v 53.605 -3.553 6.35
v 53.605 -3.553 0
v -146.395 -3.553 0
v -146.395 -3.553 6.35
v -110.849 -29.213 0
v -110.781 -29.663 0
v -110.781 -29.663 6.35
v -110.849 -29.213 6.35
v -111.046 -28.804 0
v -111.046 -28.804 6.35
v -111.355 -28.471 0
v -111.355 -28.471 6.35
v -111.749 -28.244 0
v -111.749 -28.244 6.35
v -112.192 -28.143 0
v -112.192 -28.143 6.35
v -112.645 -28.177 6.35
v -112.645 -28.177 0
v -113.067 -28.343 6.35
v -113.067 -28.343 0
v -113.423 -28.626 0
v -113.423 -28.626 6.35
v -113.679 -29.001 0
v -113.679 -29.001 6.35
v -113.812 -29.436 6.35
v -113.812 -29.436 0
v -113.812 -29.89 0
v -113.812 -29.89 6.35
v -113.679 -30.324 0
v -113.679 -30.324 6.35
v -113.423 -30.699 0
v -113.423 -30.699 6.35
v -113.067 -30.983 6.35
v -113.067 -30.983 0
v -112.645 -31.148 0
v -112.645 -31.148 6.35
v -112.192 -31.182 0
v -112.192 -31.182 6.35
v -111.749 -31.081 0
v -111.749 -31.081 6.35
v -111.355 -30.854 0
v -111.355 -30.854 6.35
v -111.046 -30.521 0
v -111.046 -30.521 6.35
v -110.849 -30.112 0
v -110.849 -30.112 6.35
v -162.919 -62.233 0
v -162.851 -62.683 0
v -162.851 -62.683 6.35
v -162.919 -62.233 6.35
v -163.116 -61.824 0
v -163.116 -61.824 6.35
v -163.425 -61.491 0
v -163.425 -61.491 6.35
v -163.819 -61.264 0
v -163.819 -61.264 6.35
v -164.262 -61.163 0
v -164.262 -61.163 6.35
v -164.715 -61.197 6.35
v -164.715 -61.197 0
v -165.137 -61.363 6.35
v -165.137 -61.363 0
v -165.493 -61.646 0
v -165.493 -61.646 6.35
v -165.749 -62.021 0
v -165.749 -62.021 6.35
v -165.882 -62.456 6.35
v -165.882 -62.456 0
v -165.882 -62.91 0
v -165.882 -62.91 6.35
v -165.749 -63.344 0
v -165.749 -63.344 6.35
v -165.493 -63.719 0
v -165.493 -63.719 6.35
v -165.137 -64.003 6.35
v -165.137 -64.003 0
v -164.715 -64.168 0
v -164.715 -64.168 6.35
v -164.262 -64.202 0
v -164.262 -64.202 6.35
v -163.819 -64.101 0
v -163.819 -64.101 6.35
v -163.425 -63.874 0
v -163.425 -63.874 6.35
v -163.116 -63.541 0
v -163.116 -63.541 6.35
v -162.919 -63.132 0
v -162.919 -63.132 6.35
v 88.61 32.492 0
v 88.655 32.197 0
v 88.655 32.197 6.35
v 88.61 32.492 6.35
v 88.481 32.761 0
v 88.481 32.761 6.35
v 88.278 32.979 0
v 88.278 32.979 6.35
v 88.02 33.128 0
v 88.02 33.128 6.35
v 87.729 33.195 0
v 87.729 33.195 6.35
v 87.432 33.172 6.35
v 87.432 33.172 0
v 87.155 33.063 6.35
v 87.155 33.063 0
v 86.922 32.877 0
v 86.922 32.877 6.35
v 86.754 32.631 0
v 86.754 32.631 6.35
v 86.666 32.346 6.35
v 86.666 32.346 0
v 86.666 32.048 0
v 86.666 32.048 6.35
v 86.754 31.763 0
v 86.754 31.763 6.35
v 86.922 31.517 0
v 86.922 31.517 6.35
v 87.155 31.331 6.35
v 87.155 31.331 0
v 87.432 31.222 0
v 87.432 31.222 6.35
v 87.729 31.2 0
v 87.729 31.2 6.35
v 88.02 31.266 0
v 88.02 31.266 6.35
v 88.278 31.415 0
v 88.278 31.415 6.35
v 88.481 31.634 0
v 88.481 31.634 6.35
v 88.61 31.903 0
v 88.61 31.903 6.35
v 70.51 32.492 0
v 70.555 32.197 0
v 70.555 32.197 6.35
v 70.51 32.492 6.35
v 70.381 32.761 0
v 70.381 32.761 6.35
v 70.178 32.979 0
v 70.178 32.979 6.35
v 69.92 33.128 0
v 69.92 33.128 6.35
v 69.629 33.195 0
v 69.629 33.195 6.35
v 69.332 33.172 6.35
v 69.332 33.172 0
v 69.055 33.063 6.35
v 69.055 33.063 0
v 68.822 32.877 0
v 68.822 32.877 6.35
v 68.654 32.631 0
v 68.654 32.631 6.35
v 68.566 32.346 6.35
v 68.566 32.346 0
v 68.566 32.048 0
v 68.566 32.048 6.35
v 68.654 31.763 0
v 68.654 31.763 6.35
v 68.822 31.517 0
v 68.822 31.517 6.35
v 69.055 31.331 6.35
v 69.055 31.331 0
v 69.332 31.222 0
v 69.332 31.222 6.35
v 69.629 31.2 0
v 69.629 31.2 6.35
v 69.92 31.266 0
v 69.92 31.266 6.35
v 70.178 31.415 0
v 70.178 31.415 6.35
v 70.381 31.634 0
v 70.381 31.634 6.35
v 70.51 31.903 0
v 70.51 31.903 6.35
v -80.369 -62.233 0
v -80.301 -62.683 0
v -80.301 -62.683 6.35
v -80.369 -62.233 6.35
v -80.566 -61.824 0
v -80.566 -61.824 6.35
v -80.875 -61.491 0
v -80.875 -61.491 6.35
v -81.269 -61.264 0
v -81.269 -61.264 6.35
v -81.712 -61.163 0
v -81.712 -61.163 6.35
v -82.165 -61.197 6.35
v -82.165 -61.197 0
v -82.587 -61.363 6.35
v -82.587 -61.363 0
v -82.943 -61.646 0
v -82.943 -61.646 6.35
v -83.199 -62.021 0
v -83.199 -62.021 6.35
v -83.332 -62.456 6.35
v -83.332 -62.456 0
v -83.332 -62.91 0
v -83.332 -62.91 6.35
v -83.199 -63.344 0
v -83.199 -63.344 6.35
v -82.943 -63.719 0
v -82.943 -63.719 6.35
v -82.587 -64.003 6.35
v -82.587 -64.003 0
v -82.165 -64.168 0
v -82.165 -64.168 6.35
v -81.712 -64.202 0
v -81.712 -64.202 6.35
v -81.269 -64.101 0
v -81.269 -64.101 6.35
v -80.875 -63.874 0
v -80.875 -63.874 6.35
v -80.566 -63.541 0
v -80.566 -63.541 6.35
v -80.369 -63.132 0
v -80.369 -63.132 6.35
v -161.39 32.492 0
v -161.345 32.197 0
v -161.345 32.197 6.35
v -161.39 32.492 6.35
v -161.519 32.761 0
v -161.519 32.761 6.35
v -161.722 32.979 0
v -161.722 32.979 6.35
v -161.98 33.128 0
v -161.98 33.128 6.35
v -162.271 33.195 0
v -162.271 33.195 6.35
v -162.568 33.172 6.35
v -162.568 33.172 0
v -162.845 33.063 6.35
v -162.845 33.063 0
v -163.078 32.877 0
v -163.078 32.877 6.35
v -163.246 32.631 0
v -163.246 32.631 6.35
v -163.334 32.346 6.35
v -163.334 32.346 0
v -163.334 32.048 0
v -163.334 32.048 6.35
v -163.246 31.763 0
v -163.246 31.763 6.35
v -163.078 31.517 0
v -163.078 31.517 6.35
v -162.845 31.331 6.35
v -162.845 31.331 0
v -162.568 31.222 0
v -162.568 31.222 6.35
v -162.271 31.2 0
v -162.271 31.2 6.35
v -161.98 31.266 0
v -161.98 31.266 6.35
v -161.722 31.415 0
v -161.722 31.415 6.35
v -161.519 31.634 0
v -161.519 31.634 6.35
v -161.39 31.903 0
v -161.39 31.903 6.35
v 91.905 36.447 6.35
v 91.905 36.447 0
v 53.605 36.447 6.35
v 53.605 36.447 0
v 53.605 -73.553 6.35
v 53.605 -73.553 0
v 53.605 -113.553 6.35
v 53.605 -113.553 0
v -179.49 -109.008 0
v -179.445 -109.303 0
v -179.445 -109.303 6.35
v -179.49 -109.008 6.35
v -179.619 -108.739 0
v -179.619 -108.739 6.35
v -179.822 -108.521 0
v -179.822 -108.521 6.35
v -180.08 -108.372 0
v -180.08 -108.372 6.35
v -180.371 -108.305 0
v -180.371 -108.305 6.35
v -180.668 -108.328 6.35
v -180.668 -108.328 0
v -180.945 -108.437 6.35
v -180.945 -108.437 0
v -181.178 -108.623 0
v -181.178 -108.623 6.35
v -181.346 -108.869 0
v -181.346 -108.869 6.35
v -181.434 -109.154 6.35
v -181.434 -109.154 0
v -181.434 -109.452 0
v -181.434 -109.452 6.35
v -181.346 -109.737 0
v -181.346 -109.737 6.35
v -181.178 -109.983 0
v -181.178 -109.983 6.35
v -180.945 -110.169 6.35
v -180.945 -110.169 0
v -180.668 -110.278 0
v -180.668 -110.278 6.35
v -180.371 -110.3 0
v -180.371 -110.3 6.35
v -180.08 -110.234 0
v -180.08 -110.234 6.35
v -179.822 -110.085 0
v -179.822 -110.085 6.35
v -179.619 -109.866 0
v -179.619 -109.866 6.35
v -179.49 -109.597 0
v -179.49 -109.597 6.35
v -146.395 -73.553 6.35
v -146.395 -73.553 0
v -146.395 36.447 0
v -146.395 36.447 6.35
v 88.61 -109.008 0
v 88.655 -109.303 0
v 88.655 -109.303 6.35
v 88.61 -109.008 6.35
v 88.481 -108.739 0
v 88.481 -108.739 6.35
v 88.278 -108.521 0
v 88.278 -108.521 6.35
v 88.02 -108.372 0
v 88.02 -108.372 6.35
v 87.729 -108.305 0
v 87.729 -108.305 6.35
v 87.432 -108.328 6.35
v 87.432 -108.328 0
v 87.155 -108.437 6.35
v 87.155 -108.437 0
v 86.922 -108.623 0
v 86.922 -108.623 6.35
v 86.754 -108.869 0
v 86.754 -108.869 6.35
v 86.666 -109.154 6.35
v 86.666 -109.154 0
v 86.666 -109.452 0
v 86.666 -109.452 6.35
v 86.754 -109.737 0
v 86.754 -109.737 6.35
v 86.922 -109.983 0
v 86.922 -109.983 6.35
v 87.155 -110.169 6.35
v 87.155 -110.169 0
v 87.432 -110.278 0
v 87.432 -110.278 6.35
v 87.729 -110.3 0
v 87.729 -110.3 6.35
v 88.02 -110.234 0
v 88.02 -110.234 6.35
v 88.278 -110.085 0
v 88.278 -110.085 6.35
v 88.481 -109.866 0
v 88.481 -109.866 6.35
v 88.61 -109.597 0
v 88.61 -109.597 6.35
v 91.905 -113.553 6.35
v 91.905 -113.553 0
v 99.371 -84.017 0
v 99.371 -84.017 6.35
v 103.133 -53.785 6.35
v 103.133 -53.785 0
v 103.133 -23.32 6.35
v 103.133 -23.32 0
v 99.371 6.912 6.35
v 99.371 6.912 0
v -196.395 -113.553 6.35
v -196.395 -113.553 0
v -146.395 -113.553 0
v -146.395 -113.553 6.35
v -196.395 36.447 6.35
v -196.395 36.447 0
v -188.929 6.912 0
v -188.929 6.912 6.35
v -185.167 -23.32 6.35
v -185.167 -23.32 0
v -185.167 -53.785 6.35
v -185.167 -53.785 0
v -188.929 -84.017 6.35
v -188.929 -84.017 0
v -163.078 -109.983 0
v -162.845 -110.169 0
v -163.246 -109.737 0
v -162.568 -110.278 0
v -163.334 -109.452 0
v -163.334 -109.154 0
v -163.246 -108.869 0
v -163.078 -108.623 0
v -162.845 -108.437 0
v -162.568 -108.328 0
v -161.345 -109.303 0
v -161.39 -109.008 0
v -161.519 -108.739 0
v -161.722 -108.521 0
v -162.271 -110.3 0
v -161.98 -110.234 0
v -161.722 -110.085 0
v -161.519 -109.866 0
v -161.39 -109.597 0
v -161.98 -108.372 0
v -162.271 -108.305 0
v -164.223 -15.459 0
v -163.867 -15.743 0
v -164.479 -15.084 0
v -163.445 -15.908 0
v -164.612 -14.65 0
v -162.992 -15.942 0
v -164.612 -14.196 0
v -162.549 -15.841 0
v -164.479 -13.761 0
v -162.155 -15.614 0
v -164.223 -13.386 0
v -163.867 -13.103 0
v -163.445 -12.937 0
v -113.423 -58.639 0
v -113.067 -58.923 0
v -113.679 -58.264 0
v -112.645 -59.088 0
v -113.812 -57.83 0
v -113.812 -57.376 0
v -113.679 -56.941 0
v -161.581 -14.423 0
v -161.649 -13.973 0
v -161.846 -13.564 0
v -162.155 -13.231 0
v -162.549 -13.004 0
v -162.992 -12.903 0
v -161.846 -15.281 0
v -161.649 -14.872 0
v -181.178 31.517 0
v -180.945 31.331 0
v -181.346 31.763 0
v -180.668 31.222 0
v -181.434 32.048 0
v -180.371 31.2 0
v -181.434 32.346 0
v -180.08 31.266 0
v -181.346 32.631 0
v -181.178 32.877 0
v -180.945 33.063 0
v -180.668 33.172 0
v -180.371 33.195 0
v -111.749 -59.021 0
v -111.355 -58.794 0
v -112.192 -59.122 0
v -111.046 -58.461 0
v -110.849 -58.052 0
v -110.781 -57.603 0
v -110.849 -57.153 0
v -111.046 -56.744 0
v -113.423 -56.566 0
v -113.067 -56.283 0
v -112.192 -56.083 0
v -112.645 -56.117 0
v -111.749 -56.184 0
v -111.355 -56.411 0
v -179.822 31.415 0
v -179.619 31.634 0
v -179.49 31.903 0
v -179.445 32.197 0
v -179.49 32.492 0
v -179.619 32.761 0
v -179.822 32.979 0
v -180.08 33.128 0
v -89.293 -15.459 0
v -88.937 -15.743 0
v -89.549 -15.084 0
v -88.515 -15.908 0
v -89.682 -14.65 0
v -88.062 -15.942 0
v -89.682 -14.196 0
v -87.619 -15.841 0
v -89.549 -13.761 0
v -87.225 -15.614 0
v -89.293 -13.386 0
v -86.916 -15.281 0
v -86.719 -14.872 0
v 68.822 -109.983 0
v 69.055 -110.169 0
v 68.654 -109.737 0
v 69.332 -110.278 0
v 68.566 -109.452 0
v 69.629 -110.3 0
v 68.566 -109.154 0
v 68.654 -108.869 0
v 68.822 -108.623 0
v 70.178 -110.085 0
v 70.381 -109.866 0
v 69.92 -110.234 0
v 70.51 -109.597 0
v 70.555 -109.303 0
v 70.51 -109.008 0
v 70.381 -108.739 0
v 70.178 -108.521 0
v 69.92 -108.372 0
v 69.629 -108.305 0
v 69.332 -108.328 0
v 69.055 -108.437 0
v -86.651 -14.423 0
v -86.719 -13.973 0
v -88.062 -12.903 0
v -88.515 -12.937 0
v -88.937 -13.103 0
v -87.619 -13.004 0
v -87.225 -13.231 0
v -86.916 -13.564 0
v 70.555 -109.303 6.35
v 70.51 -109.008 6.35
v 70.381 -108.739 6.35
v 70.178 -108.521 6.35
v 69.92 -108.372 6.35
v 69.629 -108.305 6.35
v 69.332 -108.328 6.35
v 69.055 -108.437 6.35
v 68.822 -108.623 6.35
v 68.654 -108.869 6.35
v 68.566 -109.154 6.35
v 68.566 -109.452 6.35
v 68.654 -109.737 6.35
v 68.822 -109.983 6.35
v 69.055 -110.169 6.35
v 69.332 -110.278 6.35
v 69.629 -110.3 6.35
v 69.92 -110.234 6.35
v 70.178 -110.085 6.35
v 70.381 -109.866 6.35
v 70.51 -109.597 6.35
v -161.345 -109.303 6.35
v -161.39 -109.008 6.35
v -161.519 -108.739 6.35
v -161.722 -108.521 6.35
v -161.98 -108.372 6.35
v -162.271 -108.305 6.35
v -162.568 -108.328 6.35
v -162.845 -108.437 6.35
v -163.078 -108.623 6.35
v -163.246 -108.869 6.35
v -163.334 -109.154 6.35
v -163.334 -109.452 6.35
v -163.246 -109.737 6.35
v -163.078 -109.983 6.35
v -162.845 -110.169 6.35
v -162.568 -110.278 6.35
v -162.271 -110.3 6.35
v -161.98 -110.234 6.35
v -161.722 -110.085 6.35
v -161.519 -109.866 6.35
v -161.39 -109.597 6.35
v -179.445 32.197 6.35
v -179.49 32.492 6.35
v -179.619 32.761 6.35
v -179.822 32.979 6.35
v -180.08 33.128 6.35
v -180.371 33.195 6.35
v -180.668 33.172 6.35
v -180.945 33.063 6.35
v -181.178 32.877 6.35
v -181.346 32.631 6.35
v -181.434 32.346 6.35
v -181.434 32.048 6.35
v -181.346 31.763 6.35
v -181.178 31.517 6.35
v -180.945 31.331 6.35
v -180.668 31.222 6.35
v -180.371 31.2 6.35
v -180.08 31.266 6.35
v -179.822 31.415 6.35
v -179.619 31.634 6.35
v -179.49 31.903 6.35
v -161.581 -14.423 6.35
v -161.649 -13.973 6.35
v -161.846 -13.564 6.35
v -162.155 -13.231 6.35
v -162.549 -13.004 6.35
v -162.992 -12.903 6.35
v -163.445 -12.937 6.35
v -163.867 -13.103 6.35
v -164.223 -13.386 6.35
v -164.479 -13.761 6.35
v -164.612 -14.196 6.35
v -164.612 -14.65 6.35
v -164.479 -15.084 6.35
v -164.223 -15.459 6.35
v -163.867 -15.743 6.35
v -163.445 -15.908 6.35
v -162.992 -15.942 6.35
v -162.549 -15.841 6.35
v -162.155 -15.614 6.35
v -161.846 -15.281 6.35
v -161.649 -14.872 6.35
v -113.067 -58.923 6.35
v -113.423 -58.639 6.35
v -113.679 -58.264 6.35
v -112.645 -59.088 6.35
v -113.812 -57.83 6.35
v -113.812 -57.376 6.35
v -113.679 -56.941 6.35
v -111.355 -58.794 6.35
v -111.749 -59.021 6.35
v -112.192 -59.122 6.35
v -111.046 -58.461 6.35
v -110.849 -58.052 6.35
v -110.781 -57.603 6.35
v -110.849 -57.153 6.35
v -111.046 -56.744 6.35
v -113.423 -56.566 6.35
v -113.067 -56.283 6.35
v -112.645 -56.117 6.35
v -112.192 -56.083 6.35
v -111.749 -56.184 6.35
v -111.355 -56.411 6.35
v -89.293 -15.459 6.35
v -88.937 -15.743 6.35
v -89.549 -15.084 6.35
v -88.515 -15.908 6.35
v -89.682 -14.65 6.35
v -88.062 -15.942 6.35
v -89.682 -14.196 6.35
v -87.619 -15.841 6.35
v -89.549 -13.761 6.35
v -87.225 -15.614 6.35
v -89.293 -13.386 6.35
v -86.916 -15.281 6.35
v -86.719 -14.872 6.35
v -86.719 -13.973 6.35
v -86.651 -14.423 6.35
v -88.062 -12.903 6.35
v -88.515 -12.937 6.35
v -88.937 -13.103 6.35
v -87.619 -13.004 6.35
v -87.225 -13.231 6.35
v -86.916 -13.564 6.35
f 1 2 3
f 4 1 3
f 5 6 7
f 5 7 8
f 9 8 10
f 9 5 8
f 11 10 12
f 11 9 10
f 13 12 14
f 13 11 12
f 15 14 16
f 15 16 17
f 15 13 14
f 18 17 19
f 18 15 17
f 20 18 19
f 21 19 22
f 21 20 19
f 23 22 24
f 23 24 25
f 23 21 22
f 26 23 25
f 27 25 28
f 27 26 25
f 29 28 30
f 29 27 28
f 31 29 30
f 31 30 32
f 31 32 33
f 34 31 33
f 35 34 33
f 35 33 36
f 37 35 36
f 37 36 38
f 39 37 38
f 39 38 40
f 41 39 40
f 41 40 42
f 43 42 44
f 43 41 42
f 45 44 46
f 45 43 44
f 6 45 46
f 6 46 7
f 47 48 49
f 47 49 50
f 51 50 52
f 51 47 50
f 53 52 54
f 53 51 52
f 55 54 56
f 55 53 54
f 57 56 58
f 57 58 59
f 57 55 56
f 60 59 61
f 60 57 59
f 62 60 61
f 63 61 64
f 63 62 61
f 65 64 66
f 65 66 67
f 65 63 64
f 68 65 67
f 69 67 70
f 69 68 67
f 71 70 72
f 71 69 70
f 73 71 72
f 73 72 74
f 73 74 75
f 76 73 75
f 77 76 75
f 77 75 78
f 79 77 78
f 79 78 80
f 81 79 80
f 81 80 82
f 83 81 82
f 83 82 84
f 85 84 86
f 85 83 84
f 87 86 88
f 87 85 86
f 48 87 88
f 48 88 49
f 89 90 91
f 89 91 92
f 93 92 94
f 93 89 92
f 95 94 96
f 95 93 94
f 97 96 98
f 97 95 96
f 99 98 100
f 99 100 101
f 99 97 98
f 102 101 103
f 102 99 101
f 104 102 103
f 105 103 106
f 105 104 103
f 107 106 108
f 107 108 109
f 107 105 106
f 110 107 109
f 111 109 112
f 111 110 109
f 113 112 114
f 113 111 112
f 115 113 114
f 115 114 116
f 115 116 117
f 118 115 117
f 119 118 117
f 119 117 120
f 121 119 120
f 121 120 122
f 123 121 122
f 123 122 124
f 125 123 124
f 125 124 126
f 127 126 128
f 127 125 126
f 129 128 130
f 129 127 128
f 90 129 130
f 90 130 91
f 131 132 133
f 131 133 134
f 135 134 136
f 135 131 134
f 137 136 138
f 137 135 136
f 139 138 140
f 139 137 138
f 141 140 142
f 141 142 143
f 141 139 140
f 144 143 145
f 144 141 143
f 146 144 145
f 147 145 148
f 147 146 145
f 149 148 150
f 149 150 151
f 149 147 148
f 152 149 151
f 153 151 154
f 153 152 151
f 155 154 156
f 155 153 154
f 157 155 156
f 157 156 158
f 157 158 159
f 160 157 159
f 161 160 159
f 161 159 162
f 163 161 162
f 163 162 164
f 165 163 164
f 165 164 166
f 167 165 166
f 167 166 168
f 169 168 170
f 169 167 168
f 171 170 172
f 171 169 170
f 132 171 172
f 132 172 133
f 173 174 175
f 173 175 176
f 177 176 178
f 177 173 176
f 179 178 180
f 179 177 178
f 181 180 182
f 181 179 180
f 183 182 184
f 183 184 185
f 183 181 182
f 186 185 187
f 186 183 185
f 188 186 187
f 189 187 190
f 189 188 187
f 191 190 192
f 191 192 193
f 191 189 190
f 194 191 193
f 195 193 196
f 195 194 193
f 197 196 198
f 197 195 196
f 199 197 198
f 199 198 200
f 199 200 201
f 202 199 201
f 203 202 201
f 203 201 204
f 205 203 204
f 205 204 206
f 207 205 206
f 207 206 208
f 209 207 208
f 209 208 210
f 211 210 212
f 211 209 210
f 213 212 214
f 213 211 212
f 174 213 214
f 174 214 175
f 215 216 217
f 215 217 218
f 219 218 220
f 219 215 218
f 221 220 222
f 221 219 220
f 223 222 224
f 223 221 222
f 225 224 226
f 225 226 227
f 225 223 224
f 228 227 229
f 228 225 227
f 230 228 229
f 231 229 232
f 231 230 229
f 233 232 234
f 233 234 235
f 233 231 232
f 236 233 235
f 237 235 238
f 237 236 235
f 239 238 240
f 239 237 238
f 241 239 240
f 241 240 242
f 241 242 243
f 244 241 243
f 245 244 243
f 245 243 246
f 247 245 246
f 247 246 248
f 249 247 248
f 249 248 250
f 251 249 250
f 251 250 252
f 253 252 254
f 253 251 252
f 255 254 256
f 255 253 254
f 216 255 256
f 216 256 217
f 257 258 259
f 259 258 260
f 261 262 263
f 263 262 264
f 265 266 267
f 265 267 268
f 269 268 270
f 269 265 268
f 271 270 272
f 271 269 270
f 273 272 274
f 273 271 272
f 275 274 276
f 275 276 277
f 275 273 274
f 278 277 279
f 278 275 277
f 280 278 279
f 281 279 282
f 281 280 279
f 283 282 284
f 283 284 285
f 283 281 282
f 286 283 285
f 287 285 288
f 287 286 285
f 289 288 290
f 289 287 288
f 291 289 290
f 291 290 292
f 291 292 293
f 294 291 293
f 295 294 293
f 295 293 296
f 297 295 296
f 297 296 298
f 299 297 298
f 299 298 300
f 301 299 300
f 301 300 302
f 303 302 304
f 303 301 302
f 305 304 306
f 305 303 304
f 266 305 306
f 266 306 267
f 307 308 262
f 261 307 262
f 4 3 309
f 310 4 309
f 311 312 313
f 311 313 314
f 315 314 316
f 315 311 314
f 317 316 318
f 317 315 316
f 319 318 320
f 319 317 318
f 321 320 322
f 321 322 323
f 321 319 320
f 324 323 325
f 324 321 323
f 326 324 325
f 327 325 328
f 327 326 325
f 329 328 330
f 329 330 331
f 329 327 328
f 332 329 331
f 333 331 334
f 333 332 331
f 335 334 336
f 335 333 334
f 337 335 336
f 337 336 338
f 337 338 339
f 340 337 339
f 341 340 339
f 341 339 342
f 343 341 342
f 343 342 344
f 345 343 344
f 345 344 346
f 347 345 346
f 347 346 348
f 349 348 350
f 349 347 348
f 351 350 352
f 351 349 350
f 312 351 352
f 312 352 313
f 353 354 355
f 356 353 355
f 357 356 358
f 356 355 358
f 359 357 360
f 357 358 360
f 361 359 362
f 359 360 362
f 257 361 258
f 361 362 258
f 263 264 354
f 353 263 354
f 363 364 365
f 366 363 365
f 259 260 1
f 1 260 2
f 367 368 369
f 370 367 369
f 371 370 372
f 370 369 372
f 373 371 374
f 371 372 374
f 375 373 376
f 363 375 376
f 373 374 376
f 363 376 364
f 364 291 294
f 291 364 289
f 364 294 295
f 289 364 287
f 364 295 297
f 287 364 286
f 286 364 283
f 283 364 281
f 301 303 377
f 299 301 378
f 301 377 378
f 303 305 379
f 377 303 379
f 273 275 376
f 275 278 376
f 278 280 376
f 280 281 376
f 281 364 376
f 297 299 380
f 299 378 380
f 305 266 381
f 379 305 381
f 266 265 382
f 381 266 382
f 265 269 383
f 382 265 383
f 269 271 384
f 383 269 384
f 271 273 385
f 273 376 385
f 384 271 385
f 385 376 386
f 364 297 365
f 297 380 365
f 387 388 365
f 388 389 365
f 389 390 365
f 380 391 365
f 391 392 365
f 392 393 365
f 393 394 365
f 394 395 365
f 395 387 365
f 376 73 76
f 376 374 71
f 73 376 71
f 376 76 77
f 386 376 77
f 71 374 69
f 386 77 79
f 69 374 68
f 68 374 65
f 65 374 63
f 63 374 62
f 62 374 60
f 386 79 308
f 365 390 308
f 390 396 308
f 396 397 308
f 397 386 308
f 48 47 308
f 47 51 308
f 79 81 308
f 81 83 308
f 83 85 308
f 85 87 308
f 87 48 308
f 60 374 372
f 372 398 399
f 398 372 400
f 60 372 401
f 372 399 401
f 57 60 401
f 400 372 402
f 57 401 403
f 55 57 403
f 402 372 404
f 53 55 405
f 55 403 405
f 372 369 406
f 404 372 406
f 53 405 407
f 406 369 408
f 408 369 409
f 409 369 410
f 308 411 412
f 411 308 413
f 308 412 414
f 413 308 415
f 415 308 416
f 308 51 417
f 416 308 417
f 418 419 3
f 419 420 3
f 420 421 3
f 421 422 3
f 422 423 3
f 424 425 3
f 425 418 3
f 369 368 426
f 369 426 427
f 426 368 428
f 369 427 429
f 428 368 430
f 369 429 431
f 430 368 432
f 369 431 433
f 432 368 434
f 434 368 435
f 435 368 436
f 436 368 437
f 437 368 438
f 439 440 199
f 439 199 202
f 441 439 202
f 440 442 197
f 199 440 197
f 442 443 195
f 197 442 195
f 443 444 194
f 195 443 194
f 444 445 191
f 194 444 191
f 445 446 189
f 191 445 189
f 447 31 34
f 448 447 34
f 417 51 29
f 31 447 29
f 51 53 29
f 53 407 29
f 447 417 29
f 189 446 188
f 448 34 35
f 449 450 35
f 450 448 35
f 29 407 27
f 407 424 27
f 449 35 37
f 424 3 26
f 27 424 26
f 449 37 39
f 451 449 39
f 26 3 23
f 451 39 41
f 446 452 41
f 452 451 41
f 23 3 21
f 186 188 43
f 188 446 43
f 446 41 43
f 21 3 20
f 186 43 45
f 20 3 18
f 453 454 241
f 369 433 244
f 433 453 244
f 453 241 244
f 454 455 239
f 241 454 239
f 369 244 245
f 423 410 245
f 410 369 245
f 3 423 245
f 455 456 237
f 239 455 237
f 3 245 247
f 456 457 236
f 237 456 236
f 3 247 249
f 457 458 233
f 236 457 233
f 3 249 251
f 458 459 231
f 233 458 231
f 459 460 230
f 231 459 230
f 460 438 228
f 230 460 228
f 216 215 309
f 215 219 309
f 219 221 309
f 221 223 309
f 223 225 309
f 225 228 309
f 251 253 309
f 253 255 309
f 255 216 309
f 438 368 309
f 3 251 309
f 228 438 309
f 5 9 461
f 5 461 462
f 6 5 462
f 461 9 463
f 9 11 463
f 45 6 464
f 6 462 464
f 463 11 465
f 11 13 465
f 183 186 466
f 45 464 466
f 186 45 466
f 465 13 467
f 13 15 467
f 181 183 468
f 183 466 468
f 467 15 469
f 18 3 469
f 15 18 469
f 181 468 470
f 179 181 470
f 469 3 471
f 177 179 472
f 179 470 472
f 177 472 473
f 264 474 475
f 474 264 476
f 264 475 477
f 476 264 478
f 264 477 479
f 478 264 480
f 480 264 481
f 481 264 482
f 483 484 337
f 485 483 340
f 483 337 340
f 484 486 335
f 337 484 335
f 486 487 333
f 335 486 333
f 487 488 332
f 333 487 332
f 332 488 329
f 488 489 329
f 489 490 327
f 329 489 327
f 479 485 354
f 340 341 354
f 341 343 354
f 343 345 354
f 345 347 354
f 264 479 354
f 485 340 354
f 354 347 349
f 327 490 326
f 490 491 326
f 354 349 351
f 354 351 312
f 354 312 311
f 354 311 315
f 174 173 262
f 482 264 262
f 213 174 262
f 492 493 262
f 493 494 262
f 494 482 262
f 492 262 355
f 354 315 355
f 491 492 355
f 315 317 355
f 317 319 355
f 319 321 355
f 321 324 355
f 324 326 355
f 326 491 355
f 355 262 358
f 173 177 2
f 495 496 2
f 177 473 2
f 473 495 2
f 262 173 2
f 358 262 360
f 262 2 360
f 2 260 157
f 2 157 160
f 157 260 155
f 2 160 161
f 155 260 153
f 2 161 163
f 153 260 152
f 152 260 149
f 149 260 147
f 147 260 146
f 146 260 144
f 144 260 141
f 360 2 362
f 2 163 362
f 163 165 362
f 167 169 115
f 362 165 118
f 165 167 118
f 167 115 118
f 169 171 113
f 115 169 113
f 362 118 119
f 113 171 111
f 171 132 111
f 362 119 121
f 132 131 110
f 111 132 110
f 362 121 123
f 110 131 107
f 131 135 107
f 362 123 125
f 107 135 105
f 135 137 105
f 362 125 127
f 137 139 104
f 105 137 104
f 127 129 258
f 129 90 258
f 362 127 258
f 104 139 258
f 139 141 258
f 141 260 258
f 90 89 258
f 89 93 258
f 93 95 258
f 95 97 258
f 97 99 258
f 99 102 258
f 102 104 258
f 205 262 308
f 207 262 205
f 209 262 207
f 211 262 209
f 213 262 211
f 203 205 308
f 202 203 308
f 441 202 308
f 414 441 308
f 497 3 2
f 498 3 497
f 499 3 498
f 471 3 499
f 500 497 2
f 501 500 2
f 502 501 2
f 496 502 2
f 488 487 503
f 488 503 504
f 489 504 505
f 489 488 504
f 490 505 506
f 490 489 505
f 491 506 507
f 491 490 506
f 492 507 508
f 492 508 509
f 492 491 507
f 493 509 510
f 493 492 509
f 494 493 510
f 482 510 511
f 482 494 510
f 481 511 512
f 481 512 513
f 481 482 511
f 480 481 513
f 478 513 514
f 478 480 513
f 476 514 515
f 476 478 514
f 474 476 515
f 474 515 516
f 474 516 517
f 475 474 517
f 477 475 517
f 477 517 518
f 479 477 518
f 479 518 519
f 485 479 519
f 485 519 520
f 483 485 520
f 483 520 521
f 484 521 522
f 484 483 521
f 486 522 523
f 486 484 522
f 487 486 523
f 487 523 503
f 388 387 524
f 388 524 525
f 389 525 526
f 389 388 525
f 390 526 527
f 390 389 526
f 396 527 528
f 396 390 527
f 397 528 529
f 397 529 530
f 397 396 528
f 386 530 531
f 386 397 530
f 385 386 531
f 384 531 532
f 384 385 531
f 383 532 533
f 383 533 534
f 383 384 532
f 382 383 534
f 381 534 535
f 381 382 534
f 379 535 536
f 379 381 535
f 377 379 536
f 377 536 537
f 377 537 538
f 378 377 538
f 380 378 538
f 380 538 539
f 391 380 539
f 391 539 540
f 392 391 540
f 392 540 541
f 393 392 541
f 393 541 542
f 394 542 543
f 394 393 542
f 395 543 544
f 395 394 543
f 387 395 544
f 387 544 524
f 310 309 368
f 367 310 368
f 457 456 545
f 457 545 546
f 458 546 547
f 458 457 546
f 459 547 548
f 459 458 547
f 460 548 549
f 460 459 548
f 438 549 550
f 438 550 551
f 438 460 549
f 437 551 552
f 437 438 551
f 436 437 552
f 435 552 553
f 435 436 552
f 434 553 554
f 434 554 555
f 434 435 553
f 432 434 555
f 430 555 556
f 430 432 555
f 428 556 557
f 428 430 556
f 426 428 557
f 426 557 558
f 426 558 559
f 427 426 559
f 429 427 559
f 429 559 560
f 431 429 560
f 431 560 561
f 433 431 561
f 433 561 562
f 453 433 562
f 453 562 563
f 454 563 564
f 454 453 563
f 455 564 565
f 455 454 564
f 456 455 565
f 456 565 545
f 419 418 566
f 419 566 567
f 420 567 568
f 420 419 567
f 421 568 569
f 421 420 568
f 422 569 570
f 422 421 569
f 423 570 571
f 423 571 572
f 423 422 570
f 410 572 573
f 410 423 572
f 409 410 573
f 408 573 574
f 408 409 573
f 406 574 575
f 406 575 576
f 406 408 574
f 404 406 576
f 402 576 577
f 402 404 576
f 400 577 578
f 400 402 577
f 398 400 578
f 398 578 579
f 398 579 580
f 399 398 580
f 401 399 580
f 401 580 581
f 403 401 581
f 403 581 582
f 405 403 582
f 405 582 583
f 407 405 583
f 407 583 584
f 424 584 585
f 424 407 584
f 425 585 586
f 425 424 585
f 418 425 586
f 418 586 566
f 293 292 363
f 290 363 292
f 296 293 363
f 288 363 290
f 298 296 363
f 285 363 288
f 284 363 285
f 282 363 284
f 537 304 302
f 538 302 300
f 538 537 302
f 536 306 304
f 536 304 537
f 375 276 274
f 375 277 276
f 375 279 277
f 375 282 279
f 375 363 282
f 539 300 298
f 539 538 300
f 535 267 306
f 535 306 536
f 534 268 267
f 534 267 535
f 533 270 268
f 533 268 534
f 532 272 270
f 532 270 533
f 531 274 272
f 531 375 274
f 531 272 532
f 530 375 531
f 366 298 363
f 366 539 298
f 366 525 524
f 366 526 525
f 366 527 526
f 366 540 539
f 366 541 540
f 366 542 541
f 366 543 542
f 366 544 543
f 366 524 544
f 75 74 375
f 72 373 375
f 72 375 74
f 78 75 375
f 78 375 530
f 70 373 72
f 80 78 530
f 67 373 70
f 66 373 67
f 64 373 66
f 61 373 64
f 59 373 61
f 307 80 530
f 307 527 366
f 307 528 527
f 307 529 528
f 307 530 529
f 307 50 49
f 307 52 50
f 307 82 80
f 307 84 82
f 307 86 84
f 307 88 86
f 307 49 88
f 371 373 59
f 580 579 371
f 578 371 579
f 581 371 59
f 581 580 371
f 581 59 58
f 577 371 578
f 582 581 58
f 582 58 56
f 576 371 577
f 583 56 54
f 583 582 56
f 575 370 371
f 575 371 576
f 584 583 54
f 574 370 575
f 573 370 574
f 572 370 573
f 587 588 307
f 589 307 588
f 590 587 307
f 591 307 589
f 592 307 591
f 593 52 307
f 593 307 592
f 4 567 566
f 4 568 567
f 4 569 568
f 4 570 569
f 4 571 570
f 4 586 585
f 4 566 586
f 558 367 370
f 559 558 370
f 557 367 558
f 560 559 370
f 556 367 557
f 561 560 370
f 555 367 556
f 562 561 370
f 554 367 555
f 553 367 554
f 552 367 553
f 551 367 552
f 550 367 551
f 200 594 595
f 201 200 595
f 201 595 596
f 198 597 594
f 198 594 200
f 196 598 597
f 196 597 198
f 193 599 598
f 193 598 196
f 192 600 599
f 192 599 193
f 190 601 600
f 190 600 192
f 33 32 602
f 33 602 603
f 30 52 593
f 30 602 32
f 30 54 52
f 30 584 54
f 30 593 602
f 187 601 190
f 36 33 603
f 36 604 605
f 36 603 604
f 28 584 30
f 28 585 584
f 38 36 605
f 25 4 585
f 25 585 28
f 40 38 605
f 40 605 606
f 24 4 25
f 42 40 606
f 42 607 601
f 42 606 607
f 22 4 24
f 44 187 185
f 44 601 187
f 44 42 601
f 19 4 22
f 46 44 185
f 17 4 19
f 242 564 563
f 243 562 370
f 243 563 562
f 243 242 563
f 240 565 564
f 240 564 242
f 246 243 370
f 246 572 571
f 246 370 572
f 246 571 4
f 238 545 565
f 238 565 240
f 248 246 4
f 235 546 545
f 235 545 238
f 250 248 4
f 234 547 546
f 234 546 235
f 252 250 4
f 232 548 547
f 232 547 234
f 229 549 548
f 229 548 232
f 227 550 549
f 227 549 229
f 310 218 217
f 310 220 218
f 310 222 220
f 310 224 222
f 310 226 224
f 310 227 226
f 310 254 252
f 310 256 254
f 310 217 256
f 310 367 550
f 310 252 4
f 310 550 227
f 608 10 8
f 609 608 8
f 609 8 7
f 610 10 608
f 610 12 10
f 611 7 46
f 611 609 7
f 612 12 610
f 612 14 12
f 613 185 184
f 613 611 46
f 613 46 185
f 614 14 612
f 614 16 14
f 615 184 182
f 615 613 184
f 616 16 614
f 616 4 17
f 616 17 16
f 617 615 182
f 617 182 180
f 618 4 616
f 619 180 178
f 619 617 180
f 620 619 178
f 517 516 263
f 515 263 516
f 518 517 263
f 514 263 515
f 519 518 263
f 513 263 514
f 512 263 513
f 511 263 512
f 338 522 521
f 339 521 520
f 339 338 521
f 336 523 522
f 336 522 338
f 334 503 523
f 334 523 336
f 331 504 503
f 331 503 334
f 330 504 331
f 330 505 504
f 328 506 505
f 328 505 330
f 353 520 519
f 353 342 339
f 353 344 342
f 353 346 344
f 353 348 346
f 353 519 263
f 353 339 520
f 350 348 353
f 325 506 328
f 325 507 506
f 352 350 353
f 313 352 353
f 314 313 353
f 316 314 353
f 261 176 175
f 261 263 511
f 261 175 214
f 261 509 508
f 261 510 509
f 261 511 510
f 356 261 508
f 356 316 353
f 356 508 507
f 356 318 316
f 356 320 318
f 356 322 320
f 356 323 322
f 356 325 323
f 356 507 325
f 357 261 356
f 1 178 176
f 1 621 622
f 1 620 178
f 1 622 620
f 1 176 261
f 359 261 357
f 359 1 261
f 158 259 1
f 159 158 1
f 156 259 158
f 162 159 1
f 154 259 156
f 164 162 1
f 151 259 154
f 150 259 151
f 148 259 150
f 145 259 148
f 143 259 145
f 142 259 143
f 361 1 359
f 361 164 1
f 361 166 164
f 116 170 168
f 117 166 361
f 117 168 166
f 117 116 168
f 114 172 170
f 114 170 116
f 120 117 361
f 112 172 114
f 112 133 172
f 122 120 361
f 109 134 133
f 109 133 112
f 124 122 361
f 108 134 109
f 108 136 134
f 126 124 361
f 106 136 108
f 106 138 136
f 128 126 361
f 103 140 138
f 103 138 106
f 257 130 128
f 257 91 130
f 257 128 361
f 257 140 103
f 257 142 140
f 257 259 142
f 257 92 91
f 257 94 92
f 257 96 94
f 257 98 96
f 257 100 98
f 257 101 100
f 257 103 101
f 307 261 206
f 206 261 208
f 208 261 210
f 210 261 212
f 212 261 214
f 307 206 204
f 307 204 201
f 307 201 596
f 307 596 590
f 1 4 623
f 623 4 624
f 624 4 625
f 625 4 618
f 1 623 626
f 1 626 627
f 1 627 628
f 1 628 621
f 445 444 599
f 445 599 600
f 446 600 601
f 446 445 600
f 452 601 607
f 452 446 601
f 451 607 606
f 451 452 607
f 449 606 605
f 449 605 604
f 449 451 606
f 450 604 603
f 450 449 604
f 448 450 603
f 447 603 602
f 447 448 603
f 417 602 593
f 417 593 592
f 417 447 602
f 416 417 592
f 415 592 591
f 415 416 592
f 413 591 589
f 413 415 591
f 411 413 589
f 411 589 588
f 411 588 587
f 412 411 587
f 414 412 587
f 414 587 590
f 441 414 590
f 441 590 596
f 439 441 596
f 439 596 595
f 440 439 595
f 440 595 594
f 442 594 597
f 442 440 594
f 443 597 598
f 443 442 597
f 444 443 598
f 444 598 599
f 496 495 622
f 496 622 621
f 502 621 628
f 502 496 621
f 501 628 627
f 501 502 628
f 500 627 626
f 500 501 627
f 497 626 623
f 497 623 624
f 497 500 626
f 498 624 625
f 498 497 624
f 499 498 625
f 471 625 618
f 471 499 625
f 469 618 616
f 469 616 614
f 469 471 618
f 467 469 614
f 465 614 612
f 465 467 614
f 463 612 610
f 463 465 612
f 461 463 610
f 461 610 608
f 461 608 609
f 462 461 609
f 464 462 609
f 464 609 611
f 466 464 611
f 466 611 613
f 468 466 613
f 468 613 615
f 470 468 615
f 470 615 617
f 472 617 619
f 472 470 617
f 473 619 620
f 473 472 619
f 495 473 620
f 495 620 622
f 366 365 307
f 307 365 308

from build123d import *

# Parameters (mm, degrees)
F0_R     = 1
F0_R_2   = 1.524
F1_DEPTH = 6.35


with BuildPart() as f1:
    # F0 (on Top) → F1 (new body)
    with BuildSketch(Plane.XY):
        with BuildLine():
            ThreePointArc((-196.395448, 36.447306), (-184.695448, -38.552694), (-196.395448, -113.552694))
            Line((-196.395448, -113.552694), (-146.395448, -113.552694))
            Line((-146.395448, -113.552694), (-146.395448, -73.552694))
            Line((-146.395448, -73.552694), (53.604552, -73.552694))
            Line((53.604552, -73.552694), (53.604552, -113.552694))
            Line((53.604552, -113.552694), (91.904552, -113.552694))
            ThreePointArc((91.904552, -113.552694), (103.604552, -38.552694), (91.904552, 36.447306))
            Line((91.904552, 36.447306), (65.304552, 36.447306))
            Line((65.304552, 36.447306), (53.604552, 36.447306))
            Line((53.604552, 36.447306), (53.604552, -3.552694))
            Line((53.604552, -3.552694), (-146.395448, -3.552694))
            Line((-146.395448, -3.552694), (-146.395448, 36.447306))
            Line((-146.395448, 36.447306), (-158.095448, 36.447306))
            Line((-158.095448, 36.447306), (-184.695448, 36.447306))
            Line((-184.695448, 36.447306), (-196.395448, 36.447306))
        make_face()
        with Locations((-180.445448, -109.302694)):
            Circle(F0_R, mode=Mode.SUBTRACT)
        with Locations((-162.345448, -109.302694)):
            Circle(F0_R, mode=Mode.SUBTRACT)
        with Locations((-164.375448, -62.682694)):
            Circle(F0_R_2, mode=Mode.SUBTRACT)
        with Locations((-112.305448, -57.602694)):
            Circle(F0_R_2, mode=Mode.SUBTRACT)
        with Locations((-81.825448, -62.682694)):
            Circle(F0_R_2, mode=Mode.SUBTRACT)
        with Locations((69.554552, -109.302694)):
            Circle(F0_R, mode=Mode.SUBTRACT)
        with Locations((87.654552, -109.302694)):
            Circle(F0_R, mode=Mode.SUBTRACT)
        with Locations((-163.105448, -14.422694)):
            Circle(F0_R_2, mode=Mode.SUBTRACT)
        with Locations((-112.305448, -29.662694)):
            Circle(F0_R_2, mode=Mode.SUBTRACT)
        with Locations((-88.175448, -14.422694)):
            Circle(F0_R_2, mode=Mode.SUBTRACT)
        with Locations((-180.445448, 32.197306)):
            Circle(F0_R, mode=Mode.SUBTRACT)
        with Locations((-162.345448, 32.197306)):
            Circle(F0_R, mode=Mode.SUBTRACT)
        with Locations((69.554552, 32.197306)):
            Circle(F0_R, mode=Mode.SUBTRACT)
        with Locations((87.654552, 32.197306)):
            Circle(F0_R, mode=Mode.SUBTRACT)
    extrude(amount=F1_DEPTH)


solid = f1.part
